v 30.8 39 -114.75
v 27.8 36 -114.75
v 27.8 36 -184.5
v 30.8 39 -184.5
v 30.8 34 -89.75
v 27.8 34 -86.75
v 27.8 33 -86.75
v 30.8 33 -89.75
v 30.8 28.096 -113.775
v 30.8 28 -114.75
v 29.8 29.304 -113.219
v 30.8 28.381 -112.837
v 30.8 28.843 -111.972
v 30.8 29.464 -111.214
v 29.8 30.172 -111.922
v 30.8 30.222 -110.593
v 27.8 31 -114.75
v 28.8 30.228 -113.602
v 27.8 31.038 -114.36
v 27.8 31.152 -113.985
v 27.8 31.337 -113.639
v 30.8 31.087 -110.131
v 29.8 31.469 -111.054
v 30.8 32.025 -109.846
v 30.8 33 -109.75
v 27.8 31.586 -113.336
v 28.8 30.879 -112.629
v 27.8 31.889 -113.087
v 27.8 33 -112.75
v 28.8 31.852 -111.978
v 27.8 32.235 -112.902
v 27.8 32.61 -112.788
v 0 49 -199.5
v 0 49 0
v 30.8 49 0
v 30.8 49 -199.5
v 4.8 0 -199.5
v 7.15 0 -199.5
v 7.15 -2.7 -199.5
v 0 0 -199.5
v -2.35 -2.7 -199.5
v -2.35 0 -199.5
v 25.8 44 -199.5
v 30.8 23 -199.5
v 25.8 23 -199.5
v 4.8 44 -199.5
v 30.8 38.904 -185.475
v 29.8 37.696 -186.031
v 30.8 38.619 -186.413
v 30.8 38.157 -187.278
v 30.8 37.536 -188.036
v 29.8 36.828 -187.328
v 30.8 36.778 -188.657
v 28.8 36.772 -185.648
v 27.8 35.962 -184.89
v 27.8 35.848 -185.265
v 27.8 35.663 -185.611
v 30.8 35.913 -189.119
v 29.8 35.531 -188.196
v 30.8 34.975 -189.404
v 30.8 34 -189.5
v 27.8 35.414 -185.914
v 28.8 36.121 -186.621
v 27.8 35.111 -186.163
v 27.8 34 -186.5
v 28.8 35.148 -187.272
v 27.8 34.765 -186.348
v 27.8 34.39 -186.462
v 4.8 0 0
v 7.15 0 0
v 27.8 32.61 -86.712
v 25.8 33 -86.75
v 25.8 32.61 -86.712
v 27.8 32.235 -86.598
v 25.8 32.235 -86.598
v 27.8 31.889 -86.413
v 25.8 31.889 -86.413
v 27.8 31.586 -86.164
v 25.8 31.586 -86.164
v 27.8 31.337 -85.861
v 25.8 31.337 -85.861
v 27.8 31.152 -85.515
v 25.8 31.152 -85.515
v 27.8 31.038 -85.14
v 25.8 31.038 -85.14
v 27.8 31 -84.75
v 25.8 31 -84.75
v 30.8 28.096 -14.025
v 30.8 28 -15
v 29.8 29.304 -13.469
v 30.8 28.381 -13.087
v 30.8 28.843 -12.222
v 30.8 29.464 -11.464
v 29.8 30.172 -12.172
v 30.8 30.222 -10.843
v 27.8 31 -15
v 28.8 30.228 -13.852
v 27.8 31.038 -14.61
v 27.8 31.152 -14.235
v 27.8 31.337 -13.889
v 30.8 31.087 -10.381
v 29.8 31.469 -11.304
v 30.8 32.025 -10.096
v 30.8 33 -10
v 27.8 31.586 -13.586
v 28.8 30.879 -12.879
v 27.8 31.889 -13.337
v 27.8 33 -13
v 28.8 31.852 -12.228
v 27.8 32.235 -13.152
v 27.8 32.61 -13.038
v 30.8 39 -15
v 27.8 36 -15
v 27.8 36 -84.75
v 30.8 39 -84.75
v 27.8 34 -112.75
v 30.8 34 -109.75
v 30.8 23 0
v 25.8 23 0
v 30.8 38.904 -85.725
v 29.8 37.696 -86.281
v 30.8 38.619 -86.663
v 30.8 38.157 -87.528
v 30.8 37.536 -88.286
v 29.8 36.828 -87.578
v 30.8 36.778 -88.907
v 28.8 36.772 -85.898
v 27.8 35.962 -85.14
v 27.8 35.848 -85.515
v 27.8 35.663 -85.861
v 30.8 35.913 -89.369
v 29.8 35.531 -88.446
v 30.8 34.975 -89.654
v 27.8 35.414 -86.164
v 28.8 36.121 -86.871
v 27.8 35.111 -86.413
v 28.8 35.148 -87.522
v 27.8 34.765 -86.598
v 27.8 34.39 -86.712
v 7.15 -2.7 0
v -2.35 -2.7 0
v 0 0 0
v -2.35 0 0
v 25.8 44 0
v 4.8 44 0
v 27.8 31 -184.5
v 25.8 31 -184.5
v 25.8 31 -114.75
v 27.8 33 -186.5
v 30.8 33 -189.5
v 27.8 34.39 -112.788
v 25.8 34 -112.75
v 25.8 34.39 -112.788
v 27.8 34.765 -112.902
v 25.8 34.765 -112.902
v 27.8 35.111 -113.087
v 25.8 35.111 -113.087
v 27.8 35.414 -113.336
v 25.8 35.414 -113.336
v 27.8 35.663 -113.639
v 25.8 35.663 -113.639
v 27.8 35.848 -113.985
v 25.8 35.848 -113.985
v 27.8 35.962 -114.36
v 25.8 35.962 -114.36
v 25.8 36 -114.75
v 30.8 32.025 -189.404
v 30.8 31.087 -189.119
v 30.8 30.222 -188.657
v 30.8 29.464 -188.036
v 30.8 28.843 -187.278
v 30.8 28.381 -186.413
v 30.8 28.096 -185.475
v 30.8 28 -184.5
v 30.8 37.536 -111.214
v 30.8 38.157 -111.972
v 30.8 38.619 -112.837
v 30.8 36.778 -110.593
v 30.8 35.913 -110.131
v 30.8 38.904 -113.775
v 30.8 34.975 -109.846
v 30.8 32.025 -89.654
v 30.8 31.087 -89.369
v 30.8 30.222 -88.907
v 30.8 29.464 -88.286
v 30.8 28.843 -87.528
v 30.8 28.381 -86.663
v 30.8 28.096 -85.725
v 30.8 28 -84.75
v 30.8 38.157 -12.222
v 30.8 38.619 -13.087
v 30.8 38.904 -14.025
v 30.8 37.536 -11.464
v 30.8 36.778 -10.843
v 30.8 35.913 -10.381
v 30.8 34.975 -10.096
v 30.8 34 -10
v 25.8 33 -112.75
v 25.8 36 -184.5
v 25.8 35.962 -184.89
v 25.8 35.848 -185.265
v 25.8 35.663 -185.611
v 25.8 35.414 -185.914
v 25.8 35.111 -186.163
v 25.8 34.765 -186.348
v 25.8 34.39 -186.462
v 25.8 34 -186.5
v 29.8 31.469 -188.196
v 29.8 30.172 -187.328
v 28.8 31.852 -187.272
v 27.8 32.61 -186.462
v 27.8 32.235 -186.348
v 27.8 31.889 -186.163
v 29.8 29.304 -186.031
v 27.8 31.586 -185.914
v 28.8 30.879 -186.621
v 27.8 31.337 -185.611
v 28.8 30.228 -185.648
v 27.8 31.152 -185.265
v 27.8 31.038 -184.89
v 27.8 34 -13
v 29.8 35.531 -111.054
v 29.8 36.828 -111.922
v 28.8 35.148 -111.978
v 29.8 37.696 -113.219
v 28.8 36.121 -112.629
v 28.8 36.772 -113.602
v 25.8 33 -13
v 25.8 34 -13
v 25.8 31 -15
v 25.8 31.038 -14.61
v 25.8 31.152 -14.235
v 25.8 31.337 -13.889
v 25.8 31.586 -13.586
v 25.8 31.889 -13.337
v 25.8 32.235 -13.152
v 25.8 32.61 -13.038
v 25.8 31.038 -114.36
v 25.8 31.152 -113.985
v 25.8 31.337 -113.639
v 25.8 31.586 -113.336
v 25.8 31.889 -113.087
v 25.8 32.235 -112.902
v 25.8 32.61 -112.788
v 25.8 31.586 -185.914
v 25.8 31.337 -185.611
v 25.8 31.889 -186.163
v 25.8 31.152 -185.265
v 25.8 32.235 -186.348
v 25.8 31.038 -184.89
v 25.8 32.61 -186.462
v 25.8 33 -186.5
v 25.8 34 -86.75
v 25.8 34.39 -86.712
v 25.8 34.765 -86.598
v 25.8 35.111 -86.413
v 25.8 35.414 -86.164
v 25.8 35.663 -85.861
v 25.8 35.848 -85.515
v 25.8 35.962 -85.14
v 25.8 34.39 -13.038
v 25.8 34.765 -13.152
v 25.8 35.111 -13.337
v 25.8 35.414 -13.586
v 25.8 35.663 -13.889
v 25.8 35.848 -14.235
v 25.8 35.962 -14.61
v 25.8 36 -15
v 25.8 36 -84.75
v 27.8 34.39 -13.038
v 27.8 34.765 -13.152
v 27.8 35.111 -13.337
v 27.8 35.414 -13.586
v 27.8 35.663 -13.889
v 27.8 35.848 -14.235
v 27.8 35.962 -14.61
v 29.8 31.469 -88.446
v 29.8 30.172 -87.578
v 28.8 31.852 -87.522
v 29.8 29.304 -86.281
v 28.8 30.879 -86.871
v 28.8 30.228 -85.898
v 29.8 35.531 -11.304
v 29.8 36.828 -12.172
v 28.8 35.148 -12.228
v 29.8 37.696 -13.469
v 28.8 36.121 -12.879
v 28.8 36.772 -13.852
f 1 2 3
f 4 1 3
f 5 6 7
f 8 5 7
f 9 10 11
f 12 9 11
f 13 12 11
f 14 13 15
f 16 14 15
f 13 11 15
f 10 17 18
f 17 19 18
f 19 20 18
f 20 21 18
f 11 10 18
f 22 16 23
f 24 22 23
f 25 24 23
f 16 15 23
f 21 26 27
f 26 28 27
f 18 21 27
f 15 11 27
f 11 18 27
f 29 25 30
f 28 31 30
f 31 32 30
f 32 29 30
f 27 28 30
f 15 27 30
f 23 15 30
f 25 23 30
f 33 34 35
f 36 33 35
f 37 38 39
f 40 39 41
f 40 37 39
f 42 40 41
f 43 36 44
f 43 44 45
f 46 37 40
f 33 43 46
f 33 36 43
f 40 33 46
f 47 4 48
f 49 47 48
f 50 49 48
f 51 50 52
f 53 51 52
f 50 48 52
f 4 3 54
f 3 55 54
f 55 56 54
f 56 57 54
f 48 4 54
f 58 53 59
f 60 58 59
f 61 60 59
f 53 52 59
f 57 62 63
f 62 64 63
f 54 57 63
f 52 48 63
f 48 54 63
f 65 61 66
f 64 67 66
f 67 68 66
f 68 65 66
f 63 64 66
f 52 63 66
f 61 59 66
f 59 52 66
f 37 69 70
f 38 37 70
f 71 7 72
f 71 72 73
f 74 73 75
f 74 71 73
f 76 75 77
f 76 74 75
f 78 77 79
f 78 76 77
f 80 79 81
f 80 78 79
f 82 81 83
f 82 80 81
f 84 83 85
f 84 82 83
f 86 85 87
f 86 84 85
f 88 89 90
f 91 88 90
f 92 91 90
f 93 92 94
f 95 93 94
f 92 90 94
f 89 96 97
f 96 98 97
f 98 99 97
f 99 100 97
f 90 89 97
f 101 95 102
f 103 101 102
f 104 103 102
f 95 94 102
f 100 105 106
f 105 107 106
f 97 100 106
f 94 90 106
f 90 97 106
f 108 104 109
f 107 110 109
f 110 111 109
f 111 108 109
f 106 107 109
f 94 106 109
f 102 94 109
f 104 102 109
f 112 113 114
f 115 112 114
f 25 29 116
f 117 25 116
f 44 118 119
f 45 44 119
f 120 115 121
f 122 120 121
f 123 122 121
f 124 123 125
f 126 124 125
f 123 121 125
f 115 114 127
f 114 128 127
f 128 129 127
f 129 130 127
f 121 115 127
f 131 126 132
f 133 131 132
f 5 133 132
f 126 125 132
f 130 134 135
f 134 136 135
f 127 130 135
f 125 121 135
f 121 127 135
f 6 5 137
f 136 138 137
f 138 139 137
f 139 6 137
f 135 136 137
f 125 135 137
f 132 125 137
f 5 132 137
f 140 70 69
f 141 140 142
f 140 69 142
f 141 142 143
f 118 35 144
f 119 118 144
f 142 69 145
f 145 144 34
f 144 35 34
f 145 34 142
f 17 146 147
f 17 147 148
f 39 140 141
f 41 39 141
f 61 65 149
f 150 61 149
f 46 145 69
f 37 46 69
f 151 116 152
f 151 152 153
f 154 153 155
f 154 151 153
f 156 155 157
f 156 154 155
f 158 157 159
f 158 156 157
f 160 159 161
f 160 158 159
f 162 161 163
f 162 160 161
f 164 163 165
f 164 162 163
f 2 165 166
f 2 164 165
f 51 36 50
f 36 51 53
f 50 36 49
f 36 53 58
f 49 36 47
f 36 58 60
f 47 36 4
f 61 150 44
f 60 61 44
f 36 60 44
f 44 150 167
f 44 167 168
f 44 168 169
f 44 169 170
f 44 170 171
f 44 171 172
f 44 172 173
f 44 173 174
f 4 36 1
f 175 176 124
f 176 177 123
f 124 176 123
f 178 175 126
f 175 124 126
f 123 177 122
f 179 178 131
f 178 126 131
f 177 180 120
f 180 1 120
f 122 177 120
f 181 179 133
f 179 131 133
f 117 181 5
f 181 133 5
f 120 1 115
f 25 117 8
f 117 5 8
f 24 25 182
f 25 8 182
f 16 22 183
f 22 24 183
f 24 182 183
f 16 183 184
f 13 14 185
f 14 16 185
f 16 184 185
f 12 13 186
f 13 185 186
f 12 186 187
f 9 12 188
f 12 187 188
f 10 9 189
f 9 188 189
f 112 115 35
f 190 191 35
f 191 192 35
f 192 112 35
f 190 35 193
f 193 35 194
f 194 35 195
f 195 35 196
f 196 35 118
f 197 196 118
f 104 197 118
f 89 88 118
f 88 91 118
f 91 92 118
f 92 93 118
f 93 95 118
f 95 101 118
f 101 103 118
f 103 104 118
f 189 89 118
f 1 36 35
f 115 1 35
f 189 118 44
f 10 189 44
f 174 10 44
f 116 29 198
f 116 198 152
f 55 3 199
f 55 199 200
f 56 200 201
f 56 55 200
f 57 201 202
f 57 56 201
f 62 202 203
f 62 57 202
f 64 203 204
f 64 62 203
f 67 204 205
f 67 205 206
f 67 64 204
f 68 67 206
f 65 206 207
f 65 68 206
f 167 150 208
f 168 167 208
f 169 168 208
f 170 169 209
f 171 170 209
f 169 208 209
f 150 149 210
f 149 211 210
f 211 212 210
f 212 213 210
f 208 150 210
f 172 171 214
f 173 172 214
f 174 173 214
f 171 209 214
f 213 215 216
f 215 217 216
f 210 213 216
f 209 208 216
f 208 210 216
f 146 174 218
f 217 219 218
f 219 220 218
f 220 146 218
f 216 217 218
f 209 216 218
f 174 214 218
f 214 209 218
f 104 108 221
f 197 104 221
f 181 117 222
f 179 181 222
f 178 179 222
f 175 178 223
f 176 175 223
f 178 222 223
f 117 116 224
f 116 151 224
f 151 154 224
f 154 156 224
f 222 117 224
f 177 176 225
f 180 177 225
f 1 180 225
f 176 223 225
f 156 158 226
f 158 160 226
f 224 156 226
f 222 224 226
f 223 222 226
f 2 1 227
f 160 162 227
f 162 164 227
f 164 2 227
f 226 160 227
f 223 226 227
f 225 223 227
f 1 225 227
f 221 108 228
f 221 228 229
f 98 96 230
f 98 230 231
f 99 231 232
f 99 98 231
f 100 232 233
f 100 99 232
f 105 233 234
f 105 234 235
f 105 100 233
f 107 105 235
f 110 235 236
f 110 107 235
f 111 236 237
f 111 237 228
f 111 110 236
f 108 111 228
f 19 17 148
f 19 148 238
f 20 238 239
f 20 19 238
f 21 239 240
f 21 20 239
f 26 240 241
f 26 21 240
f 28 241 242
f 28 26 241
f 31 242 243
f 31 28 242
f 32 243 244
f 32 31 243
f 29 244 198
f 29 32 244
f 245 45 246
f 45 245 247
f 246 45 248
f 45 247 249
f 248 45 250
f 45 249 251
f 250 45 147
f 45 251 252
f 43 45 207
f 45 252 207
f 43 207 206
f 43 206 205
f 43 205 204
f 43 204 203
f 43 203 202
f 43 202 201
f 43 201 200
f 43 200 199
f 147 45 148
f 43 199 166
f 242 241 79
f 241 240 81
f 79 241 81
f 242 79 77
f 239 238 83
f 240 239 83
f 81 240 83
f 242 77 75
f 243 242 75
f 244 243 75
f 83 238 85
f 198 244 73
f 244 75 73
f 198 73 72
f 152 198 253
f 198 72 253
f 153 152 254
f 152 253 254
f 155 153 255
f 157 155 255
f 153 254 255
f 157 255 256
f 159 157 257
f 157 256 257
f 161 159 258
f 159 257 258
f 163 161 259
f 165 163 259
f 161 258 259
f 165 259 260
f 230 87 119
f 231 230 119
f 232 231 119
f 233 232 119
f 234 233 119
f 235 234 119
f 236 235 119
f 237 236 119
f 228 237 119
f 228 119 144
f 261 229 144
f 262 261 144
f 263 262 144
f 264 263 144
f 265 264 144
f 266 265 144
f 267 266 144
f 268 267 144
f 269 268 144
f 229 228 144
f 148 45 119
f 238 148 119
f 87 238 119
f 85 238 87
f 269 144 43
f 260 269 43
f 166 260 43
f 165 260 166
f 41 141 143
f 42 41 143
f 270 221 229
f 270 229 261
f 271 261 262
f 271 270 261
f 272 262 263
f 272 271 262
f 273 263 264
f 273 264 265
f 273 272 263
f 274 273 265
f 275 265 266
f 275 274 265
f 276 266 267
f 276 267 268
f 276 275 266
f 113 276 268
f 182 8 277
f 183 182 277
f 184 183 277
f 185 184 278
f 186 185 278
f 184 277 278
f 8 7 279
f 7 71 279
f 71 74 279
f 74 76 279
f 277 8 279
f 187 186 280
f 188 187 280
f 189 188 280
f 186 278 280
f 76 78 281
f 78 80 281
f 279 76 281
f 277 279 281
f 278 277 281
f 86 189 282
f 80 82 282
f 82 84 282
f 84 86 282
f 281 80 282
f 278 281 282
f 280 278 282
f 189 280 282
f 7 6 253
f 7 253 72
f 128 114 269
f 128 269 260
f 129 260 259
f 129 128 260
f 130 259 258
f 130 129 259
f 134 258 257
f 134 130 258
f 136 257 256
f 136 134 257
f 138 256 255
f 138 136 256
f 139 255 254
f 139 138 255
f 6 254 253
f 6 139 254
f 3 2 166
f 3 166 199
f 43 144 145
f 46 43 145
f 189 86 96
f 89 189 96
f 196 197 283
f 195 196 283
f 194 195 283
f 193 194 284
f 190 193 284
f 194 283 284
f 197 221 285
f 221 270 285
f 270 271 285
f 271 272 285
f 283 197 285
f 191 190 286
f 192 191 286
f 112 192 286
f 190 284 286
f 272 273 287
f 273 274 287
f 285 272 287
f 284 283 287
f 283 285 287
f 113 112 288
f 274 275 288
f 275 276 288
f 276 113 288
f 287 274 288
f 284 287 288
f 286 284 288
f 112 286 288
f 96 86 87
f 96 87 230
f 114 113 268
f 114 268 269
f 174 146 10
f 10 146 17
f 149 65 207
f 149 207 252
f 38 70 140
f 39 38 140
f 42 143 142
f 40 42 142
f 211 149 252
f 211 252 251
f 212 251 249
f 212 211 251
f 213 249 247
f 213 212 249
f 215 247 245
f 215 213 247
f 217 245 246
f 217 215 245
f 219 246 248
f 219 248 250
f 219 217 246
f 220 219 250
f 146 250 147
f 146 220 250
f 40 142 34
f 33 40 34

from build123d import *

# Parameters (mm, degrees)
BOSS_EXTRUDE1_DEPTH = 199.5
CUT_EXTRUDE1_DEPTH  = 5
CHAMFER1_SIZE       = 3


with BuildPart() as part:
    # Sketch1 → Boss-Extrude1 (new body)
    with BuildSketch(Plane.XY):
        Polygon((0, 0), (0, 49), (30.8, 49), (30.8, 23), (25.8, 23), (25.8, 44), (4.8, 44), (4.8, 0), (7.15, 0), (7.15, -2.7), (-2.35, -2.7), (-2.35, 0), align=None)
    extrude(amount=-BOSS_EXTRUDE1_DEPTH)

    # Sketch2 → Cut-Extrude1 (cut)
    with BuildSketch(Plane(origin=(30.8, 0, 0), x_dir=(0, 0, -1), z_dir=(1, 0, 0))):
        with BuildLine():
            Line((15, 36), (84.75, 36))
            ThreePointArc((84.75, 36), (86.164213562, 35.414213562), (86.75, 34))
            Line((86.75, 34), (86.75, 33))
            ThreePointArc((86.75, 33), (86.164213562, 31.585786438), (84.75, 31))
            Line((84.75, 31), (15, 31))
            ThreePointArc((15, 31), (13.585786438, 31.585786438), (13, 33))
            Line((13, 33), (13, 34))
            ThreePointArc((13, 34), (13.585786438, 35.414213562), (15, 36))
        make_face()
        with BuildLine():
            Line((114.75, 36), (184.5, 36))
            ThreePointArc((184.5, 36), (185.914213562, 35.414213562), (186.5, 34))
            Line((186.5, 34), (186.5, 33))
            ThreePointArc((186.5, 33), (185.914213562, 31.585786438), (184.5, 31))
            Line((184.5, 31), (114.75, 31))
            ThreePointArc((114.75, 31), (113.335786438, 31.585786438), (112.75, 33))
            Line((112.75, 33), (112.75, 34))
            ThreePointArc((112.75, 34), (113.335786438, 35.414213562), (114.75, 36))
        make_face()
    extrude(amount=-CUT_EXTRUDE1_DEPTH, mode=Mode.SUBTRACT)

    # Chamfer1
    chamfer1_edges = [part.edges().sort_by_distance(p)[0] for p in [
        (30.8, 31.585786438, -185.914213562),
        (30.8, 33.5, -186.5),
        (30.8, 35.414213562, -185.914213562),
        (30.8, 36, -149.625),
        (30.8, 35.414213562, -113.335786438),
        (30.8, 33.5, -112.75),
        (30.8, 31.585786438, -113.335786438),
        (30.8, 31, -149.625),
        (30.8, 31.585786438, -86.164213562),
        (30.8, 33.5, -86.75),
        (30.8, 35.414213562, -86.164213562),
        (30.8, 36, -49.875),
        (30.8, 35.414213562, -13.585786438),
        (30.8, 33.5, -13),
        (30.8, 31.585786438, -13.585786438),
        (30.8, 31, -49.875),
    ]]
    chamfer(chamfer1_edges, length=CHAMFER1_SIZE)


solid = part.part
